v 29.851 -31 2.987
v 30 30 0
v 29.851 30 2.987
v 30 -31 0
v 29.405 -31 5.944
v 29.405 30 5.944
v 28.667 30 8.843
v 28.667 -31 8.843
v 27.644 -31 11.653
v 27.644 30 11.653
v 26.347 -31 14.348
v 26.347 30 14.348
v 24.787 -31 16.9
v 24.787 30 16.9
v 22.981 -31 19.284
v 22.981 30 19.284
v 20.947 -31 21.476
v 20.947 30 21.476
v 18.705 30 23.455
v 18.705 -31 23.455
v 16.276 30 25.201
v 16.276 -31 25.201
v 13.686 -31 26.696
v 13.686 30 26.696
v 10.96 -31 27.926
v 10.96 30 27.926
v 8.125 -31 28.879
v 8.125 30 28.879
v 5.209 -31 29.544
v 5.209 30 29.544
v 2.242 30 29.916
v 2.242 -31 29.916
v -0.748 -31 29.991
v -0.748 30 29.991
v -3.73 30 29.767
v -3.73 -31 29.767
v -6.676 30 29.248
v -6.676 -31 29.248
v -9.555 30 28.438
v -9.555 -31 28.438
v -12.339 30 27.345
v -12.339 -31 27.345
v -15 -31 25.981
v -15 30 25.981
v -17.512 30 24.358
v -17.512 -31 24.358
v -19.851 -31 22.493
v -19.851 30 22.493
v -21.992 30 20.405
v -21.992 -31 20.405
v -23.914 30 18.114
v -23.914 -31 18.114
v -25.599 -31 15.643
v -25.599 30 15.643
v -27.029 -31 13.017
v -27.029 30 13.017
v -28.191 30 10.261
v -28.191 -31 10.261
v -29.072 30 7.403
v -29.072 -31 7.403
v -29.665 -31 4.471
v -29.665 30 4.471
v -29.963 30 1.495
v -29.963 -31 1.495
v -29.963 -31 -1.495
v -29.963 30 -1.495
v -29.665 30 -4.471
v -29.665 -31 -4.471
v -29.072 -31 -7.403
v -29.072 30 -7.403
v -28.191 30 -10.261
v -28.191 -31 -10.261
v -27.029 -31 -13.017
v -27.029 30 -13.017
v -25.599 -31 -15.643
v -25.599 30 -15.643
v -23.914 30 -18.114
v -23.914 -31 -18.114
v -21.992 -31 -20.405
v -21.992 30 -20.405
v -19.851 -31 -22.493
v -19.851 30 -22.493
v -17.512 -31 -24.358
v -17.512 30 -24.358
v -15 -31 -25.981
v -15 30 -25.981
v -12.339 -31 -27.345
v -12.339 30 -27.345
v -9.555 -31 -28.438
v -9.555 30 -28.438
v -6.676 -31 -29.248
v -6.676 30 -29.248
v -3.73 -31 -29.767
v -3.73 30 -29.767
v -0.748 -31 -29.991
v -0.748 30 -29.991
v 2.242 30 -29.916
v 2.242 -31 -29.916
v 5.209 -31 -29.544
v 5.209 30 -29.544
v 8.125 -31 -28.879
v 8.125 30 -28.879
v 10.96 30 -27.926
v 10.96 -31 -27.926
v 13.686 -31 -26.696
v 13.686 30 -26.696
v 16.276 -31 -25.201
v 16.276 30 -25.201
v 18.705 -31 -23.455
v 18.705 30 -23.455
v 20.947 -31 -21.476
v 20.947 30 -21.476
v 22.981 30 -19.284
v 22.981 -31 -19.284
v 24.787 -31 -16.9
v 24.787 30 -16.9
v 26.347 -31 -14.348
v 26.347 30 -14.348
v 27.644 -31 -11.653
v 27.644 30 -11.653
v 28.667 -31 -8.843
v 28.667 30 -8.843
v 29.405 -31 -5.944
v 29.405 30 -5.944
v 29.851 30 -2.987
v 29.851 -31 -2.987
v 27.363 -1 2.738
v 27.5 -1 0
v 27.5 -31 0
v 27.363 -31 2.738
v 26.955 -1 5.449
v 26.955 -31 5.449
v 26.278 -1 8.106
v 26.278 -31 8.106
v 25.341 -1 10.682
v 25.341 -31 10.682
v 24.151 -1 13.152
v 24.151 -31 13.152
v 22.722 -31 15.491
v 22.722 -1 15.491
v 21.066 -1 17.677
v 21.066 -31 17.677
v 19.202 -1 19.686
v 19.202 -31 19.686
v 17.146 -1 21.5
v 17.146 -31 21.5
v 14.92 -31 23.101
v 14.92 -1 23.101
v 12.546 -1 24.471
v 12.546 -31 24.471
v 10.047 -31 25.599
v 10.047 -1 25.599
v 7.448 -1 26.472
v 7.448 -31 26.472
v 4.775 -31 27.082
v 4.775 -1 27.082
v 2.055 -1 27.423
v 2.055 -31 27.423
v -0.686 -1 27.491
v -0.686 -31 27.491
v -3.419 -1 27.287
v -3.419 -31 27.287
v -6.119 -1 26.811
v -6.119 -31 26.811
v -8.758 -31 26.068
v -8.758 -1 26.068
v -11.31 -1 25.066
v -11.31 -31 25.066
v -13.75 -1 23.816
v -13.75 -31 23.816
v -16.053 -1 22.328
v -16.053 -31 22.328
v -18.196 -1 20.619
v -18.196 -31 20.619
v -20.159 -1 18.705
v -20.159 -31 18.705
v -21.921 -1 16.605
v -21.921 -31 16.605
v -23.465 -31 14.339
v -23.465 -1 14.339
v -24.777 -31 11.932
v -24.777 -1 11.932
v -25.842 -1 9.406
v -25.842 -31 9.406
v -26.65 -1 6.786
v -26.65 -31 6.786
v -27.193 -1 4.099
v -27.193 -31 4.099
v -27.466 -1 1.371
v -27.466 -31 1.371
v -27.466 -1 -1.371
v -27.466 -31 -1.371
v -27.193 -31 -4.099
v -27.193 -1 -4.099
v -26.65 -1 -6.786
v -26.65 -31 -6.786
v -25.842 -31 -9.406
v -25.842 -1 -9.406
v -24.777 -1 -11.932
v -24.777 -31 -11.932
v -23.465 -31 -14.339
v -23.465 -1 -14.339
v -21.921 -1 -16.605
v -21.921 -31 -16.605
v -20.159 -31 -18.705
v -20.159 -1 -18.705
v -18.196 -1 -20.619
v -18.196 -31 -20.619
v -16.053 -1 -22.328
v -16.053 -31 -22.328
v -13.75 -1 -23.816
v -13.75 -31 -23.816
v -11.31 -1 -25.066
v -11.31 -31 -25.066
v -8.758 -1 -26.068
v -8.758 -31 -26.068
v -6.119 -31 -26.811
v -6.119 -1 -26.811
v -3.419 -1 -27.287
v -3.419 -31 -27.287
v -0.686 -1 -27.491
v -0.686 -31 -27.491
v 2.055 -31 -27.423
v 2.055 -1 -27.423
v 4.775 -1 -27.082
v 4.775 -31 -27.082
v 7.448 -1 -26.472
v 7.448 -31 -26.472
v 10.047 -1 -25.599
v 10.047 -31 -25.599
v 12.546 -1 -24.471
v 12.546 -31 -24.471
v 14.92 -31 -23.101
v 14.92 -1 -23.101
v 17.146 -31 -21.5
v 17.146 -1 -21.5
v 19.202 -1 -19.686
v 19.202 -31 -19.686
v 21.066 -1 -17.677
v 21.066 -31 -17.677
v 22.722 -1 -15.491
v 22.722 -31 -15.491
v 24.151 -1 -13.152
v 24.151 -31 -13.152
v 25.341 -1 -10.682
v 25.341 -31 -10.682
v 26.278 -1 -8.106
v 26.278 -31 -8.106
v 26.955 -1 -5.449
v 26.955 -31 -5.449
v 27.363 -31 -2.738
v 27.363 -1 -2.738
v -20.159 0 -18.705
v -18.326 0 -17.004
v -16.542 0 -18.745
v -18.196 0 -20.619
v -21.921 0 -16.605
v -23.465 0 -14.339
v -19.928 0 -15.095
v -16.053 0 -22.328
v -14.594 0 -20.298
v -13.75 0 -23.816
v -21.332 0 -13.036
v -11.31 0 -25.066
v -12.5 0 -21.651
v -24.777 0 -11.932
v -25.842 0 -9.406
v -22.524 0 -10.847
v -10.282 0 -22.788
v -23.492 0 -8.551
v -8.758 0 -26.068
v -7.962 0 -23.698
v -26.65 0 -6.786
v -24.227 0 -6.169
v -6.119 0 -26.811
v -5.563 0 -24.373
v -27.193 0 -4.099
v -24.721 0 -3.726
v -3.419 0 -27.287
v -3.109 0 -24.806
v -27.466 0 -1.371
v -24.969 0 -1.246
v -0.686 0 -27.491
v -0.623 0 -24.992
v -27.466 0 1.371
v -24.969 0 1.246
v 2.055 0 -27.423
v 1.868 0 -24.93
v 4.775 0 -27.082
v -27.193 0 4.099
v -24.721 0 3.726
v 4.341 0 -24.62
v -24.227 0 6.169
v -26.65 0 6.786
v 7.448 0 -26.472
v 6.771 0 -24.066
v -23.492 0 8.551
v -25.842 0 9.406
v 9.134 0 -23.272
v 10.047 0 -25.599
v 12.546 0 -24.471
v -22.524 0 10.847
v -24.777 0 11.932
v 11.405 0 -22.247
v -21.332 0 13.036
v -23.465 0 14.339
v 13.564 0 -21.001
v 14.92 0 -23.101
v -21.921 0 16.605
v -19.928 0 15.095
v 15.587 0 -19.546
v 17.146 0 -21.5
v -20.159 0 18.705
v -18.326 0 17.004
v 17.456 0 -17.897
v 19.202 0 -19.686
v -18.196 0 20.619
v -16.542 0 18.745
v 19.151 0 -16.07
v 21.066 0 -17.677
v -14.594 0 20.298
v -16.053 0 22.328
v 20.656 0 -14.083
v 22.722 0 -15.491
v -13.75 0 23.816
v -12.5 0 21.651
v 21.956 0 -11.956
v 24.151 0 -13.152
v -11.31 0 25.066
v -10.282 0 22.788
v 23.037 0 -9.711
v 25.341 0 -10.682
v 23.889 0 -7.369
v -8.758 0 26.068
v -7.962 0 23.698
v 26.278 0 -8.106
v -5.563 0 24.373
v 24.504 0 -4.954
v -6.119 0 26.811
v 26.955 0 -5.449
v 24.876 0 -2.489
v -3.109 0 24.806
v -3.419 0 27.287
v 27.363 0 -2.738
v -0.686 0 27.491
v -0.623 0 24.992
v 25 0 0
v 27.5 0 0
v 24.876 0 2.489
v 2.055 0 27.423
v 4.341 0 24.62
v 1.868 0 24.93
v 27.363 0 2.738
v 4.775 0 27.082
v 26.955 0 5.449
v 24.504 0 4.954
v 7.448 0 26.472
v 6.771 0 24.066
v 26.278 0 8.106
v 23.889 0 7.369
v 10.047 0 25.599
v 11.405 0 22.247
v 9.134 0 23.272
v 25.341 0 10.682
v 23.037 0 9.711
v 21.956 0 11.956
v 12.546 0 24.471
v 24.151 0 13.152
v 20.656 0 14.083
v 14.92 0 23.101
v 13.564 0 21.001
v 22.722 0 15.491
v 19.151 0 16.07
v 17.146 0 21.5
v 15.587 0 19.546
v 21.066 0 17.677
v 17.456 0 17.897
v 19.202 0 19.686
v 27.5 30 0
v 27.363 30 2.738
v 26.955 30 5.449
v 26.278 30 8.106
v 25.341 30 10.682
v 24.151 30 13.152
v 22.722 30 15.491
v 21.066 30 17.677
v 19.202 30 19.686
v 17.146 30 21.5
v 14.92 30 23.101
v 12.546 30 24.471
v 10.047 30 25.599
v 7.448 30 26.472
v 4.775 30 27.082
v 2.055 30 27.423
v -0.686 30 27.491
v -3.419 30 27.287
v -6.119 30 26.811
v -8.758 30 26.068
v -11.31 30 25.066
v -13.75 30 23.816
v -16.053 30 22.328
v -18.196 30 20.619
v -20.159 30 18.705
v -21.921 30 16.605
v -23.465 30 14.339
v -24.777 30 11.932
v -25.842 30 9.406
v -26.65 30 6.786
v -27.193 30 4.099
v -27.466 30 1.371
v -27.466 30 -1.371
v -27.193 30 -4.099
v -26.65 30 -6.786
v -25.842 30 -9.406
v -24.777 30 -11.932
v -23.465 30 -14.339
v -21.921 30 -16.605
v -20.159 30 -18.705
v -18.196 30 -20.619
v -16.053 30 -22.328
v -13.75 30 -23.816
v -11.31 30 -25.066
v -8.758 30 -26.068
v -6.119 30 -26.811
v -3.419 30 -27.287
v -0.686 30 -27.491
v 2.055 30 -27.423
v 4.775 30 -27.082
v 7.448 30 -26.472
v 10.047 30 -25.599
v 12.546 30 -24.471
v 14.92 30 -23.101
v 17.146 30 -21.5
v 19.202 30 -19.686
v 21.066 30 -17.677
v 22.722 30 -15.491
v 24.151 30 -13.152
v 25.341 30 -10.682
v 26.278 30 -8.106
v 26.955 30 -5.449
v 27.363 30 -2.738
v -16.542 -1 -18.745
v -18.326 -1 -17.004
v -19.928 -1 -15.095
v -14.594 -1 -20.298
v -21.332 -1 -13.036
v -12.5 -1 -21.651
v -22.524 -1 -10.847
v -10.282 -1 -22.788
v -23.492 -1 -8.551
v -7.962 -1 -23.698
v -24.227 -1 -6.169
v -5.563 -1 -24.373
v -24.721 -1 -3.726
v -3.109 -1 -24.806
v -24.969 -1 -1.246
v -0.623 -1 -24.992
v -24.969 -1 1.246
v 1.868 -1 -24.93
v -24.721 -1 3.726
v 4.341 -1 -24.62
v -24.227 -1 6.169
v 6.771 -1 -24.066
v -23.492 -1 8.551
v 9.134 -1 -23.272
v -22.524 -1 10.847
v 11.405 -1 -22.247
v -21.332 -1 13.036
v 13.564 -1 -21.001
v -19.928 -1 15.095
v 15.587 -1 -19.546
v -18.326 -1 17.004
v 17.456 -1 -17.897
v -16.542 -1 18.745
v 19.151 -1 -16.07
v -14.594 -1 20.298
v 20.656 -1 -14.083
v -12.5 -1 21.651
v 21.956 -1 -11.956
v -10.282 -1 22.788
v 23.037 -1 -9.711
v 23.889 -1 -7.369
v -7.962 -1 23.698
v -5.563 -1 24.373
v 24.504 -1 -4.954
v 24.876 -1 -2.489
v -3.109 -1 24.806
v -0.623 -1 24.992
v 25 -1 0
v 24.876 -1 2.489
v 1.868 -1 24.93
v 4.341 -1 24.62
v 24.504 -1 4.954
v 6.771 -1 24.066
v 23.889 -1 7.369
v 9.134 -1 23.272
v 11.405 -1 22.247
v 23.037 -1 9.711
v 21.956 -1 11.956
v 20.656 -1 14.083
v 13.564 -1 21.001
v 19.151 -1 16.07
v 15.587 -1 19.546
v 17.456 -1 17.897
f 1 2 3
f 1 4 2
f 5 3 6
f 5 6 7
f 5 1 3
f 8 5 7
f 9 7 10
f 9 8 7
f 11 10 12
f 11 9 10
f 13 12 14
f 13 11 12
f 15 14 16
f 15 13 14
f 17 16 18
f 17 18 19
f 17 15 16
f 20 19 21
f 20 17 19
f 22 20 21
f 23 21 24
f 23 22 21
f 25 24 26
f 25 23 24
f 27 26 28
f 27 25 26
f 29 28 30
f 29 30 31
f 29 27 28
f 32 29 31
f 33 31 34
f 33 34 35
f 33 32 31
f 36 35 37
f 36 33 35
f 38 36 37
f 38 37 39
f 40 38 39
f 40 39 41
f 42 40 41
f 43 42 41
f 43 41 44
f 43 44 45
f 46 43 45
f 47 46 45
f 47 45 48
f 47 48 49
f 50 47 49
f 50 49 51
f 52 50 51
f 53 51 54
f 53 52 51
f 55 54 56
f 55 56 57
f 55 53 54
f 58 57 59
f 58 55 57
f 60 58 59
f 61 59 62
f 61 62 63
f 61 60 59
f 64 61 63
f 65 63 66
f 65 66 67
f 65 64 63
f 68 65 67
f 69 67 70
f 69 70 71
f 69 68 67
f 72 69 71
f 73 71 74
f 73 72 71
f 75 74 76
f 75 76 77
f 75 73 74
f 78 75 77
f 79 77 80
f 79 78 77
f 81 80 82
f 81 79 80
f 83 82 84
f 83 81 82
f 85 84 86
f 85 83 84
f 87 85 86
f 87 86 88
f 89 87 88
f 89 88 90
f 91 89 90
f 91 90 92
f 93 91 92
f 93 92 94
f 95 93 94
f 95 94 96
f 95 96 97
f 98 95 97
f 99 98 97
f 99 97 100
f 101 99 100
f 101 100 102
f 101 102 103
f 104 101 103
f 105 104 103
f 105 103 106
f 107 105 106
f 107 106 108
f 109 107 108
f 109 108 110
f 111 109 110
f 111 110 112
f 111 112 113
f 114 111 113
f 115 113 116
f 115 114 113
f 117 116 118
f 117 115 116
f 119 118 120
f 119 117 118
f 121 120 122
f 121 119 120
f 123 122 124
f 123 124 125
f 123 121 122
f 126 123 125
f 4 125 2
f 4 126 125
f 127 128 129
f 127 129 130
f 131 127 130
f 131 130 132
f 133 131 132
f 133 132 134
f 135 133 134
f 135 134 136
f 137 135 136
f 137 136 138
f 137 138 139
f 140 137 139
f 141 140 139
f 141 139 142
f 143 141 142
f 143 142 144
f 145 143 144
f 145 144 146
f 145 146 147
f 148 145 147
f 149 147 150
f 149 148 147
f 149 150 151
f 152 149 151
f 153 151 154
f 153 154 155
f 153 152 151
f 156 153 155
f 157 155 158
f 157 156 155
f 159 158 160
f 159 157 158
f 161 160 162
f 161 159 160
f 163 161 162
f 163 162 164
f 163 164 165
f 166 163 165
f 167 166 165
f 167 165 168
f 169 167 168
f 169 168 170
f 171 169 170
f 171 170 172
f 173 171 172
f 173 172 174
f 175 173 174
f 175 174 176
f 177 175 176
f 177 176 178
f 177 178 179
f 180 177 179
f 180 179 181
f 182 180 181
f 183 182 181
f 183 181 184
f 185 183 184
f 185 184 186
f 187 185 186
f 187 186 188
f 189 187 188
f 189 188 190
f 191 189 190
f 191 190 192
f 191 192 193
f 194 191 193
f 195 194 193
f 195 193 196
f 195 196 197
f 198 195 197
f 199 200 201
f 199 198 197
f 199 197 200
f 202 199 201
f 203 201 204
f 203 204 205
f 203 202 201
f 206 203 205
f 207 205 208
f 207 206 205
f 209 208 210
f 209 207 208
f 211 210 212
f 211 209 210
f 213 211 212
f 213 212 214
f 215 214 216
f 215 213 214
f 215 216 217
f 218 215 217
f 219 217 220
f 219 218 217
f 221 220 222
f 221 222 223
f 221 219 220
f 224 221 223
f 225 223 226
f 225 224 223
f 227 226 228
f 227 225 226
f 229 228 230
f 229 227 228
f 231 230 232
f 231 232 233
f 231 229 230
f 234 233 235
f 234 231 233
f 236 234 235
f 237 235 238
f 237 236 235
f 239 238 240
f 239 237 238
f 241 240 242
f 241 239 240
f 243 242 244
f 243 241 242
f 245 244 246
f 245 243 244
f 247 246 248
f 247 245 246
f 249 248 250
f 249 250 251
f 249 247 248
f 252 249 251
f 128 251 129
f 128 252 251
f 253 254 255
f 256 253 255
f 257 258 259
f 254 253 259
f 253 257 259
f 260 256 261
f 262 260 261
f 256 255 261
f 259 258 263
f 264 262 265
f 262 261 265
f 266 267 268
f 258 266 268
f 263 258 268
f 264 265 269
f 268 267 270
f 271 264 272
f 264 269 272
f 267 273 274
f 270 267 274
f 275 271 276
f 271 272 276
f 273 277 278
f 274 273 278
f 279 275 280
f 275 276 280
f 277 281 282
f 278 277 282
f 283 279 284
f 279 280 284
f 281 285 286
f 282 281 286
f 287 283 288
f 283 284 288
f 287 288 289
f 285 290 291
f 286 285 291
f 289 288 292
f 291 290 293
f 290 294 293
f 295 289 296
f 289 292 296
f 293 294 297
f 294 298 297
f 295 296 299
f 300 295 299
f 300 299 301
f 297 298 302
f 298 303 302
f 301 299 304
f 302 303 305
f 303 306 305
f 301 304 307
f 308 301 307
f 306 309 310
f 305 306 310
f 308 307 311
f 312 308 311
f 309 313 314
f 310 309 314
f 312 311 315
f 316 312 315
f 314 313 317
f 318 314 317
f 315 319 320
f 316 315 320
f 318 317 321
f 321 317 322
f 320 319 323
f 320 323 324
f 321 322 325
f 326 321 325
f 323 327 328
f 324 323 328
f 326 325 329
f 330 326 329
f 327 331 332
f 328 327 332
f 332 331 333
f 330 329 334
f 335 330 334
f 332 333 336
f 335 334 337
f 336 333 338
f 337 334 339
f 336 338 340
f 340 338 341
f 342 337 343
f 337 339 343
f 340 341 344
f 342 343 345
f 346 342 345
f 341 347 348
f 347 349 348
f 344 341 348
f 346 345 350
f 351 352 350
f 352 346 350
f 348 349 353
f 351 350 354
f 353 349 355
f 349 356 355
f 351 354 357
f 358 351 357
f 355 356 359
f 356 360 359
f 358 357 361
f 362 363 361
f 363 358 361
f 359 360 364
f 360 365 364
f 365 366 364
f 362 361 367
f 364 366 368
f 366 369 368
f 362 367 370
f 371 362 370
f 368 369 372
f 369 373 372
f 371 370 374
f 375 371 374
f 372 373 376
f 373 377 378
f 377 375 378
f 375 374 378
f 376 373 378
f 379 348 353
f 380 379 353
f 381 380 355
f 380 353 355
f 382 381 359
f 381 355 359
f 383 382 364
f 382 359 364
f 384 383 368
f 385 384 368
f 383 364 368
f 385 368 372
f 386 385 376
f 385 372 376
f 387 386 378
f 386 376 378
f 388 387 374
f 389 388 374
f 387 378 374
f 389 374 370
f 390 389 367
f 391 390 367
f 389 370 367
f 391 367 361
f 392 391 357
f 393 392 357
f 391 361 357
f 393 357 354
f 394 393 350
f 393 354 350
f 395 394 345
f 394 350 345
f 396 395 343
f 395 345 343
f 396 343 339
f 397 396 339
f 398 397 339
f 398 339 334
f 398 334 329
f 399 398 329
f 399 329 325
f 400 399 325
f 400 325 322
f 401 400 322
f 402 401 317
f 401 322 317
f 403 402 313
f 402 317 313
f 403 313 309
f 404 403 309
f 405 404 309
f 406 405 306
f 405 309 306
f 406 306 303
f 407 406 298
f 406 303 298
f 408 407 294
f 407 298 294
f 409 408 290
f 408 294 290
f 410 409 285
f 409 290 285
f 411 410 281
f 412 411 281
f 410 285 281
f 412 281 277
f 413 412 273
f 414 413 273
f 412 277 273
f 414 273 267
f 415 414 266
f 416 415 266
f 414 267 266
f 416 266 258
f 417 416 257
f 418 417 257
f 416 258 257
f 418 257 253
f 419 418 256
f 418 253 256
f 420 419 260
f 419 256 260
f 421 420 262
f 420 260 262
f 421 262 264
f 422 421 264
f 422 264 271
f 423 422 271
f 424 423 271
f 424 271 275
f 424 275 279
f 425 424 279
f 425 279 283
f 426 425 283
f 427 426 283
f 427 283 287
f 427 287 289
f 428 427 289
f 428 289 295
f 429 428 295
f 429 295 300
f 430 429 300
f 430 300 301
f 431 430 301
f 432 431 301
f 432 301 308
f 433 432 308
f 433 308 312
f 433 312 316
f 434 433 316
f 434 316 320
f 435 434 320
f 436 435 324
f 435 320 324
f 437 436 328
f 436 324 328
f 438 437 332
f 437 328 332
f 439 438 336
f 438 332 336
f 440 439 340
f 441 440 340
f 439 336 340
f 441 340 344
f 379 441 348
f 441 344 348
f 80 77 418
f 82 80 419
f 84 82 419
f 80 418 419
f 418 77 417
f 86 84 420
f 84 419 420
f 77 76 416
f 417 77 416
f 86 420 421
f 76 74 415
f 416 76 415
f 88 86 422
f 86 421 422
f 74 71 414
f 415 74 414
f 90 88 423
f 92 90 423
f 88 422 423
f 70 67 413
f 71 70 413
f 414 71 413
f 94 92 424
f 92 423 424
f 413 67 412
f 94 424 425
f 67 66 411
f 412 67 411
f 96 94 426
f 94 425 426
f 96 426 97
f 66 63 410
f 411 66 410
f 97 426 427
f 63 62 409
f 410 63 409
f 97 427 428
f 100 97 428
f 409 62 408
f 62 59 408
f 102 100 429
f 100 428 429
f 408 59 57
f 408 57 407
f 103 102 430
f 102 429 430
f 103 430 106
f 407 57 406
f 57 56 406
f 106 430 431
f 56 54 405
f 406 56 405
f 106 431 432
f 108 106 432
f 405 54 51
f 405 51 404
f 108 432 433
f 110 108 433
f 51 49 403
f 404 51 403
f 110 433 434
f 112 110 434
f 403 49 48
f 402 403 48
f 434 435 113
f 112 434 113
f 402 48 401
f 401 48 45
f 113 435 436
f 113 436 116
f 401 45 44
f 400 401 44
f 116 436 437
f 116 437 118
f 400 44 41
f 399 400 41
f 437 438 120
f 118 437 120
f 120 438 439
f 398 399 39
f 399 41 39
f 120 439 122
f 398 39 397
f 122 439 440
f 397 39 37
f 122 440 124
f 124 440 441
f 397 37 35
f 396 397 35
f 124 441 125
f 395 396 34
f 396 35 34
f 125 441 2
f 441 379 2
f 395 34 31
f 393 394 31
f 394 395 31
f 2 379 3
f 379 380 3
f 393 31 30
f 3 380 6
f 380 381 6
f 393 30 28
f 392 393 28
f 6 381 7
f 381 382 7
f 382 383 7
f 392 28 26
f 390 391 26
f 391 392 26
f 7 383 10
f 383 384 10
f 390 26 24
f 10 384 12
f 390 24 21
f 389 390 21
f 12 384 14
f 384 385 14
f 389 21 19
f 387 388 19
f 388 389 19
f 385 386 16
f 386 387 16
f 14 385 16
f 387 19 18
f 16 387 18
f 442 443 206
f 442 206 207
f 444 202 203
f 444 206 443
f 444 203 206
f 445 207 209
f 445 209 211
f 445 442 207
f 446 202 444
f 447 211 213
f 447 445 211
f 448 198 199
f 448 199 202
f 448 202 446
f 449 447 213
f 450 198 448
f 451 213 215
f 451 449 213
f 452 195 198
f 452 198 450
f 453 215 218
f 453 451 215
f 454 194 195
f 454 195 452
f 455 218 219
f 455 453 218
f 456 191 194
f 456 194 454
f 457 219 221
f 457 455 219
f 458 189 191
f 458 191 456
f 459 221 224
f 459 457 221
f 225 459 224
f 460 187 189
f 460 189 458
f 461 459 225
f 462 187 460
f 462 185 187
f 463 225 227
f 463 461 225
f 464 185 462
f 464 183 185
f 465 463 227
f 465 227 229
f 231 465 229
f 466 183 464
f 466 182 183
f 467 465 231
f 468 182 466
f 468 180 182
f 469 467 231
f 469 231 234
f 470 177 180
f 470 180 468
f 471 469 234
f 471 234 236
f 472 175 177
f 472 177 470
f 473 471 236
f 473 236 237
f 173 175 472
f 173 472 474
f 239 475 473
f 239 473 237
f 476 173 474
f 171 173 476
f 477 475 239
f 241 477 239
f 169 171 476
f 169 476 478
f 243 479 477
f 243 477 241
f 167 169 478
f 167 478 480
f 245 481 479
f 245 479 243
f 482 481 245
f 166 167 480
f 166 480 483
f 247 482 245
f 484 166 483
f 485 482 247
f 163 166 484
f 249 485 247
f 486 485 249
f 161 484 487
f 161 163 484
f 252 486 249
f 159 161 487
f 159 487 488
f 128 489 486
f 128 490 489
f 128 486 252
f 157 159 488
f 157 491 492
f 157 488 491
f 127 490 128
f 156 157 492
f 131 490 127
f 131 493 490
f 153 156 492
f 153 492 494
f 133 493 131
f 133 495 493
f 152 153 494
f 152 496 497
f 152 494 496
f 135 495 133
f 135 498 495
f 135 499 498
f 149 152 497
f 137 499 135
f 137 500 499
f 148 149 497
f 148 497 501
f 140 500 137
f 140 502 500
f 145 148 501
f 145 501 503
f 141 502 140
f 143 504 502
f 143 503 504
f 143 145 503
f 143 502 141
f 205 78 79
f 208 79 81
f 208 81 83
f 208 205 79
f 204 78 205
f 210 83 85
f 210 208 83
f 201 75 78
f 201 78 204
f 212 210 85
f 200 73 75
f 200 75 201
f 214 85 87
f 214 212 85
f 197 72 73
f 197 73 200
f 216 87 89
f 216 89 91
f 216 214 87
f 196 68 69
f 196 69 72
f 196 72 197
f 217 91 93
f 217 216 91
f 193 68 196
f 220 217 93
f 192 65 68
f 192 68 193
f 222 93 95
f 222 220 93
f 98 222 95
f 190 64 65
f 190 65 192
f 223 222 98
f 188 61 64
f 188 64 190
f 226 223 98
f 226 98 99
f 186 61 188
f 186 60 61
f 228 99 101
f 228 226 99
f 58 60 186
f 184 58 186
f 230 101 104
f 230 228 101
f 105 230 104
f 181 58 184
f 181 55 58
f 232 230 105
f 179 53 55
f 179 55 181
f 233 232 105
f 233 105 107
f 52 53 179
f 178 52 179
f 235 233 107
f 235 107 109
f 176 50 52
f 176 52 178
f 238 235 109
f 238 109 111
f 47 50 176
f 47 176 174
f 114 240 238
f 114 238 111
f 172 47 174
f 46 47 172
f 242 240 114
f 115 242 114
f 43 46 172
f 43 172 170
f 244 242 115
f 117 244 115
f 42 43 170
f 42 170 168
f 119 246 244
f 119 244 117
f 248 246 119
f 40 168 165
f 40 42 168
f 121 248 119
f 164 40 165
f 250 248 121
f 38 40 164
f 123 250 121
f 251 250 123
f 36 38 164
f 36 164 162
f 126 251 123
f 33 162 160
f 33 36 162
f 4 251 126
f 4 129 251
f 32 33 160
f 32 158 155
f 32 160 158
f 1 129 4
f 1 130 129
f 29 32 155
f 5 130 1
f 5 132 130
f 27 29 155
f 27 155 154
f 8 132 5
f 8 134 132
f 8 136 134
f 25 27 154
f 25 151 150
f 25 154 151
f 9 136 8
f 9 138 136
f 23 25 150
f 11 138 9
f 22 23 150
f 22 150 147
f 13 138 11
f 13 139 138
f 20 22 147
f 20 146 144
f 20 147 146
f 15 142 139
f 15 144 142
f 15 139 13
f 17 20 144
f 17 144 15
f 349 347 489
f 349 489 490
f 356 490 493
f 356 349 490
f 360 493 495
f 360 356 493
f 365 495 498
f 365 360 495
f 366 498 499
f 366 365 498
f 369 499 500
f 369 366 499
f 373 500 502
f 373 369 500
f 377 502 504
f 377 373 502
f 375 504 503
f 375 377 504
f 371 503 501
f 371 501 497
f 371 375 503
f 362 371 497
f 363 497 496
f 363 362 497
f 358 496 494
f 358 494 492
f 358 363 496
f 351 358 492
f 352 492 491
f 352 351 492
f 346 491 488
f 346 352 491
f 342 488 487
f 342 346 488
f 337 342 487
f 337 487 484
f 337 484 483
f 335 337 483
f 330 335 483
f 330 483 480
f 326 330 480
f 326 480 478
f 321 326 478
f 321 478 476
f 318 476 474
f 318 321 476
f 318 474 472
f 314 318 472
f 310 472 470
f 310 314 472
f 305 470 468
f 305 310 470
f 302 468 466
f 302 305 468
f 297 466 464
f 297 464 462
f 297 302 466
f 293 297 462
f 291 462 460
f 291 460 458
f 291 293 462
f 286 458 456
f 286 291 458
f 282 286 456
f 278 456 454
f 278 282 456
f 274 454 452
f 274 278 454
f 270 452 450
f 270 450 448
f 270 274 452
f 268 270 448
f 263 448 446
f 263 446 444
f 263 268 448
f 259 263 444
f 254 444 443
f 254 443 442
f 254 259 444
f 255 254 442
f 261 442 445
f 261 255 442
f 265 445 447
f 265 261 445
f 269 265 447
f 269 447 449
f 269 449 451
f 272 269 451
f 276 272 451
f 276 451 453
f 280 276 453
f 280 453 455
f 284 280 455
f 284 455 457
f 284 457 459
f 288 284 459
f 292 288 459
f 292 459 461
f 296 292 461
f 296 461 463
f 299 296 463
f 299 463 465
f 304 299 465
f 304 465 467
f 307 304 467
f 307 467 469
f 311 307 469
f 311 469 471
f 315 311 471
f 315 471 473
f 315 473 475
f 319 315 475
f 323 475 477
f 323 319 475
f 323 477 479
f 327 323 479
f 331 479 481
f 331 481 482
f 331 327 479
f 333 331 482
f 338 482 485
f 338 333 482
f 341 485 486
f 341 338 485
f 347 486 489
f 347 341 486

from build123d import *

# Parameters (mm, degrees)
F0_R     = 30
F0_R_2   = 27.5
F1_DEPTH = 31
F0_R_3   = 25
F2_DEPTH = 1
F3_DEPTH = 30


with BuildPart() as f1:
    # F0 (on Front) → F1 (new body)
    with BuildSketch(Plane.XZ):
        Circle(F0_R)
        Circle(F0_R_2, mode=Mode.SUBTRACT)
    extrude(amount=F1_DEPTH)

    # F0 (on Front) → F2 (join)
    with BuildSketch(Plane.XZ):
        Circle(F0_R_2)
        Circle(F0_R_3, mode=Mode.SUBTRACT)
    extrude(amount=F2_DEPTH)

    # F0 (on Front) → F3 (join)
    with BuildSketch(Plane.XZ):
        Circle(F0_R)
        Circle(F0_R_2, mode=Mode.SUBTRACT)
    extrude(amount=-F3_DEPTH)


solid = f1.part
